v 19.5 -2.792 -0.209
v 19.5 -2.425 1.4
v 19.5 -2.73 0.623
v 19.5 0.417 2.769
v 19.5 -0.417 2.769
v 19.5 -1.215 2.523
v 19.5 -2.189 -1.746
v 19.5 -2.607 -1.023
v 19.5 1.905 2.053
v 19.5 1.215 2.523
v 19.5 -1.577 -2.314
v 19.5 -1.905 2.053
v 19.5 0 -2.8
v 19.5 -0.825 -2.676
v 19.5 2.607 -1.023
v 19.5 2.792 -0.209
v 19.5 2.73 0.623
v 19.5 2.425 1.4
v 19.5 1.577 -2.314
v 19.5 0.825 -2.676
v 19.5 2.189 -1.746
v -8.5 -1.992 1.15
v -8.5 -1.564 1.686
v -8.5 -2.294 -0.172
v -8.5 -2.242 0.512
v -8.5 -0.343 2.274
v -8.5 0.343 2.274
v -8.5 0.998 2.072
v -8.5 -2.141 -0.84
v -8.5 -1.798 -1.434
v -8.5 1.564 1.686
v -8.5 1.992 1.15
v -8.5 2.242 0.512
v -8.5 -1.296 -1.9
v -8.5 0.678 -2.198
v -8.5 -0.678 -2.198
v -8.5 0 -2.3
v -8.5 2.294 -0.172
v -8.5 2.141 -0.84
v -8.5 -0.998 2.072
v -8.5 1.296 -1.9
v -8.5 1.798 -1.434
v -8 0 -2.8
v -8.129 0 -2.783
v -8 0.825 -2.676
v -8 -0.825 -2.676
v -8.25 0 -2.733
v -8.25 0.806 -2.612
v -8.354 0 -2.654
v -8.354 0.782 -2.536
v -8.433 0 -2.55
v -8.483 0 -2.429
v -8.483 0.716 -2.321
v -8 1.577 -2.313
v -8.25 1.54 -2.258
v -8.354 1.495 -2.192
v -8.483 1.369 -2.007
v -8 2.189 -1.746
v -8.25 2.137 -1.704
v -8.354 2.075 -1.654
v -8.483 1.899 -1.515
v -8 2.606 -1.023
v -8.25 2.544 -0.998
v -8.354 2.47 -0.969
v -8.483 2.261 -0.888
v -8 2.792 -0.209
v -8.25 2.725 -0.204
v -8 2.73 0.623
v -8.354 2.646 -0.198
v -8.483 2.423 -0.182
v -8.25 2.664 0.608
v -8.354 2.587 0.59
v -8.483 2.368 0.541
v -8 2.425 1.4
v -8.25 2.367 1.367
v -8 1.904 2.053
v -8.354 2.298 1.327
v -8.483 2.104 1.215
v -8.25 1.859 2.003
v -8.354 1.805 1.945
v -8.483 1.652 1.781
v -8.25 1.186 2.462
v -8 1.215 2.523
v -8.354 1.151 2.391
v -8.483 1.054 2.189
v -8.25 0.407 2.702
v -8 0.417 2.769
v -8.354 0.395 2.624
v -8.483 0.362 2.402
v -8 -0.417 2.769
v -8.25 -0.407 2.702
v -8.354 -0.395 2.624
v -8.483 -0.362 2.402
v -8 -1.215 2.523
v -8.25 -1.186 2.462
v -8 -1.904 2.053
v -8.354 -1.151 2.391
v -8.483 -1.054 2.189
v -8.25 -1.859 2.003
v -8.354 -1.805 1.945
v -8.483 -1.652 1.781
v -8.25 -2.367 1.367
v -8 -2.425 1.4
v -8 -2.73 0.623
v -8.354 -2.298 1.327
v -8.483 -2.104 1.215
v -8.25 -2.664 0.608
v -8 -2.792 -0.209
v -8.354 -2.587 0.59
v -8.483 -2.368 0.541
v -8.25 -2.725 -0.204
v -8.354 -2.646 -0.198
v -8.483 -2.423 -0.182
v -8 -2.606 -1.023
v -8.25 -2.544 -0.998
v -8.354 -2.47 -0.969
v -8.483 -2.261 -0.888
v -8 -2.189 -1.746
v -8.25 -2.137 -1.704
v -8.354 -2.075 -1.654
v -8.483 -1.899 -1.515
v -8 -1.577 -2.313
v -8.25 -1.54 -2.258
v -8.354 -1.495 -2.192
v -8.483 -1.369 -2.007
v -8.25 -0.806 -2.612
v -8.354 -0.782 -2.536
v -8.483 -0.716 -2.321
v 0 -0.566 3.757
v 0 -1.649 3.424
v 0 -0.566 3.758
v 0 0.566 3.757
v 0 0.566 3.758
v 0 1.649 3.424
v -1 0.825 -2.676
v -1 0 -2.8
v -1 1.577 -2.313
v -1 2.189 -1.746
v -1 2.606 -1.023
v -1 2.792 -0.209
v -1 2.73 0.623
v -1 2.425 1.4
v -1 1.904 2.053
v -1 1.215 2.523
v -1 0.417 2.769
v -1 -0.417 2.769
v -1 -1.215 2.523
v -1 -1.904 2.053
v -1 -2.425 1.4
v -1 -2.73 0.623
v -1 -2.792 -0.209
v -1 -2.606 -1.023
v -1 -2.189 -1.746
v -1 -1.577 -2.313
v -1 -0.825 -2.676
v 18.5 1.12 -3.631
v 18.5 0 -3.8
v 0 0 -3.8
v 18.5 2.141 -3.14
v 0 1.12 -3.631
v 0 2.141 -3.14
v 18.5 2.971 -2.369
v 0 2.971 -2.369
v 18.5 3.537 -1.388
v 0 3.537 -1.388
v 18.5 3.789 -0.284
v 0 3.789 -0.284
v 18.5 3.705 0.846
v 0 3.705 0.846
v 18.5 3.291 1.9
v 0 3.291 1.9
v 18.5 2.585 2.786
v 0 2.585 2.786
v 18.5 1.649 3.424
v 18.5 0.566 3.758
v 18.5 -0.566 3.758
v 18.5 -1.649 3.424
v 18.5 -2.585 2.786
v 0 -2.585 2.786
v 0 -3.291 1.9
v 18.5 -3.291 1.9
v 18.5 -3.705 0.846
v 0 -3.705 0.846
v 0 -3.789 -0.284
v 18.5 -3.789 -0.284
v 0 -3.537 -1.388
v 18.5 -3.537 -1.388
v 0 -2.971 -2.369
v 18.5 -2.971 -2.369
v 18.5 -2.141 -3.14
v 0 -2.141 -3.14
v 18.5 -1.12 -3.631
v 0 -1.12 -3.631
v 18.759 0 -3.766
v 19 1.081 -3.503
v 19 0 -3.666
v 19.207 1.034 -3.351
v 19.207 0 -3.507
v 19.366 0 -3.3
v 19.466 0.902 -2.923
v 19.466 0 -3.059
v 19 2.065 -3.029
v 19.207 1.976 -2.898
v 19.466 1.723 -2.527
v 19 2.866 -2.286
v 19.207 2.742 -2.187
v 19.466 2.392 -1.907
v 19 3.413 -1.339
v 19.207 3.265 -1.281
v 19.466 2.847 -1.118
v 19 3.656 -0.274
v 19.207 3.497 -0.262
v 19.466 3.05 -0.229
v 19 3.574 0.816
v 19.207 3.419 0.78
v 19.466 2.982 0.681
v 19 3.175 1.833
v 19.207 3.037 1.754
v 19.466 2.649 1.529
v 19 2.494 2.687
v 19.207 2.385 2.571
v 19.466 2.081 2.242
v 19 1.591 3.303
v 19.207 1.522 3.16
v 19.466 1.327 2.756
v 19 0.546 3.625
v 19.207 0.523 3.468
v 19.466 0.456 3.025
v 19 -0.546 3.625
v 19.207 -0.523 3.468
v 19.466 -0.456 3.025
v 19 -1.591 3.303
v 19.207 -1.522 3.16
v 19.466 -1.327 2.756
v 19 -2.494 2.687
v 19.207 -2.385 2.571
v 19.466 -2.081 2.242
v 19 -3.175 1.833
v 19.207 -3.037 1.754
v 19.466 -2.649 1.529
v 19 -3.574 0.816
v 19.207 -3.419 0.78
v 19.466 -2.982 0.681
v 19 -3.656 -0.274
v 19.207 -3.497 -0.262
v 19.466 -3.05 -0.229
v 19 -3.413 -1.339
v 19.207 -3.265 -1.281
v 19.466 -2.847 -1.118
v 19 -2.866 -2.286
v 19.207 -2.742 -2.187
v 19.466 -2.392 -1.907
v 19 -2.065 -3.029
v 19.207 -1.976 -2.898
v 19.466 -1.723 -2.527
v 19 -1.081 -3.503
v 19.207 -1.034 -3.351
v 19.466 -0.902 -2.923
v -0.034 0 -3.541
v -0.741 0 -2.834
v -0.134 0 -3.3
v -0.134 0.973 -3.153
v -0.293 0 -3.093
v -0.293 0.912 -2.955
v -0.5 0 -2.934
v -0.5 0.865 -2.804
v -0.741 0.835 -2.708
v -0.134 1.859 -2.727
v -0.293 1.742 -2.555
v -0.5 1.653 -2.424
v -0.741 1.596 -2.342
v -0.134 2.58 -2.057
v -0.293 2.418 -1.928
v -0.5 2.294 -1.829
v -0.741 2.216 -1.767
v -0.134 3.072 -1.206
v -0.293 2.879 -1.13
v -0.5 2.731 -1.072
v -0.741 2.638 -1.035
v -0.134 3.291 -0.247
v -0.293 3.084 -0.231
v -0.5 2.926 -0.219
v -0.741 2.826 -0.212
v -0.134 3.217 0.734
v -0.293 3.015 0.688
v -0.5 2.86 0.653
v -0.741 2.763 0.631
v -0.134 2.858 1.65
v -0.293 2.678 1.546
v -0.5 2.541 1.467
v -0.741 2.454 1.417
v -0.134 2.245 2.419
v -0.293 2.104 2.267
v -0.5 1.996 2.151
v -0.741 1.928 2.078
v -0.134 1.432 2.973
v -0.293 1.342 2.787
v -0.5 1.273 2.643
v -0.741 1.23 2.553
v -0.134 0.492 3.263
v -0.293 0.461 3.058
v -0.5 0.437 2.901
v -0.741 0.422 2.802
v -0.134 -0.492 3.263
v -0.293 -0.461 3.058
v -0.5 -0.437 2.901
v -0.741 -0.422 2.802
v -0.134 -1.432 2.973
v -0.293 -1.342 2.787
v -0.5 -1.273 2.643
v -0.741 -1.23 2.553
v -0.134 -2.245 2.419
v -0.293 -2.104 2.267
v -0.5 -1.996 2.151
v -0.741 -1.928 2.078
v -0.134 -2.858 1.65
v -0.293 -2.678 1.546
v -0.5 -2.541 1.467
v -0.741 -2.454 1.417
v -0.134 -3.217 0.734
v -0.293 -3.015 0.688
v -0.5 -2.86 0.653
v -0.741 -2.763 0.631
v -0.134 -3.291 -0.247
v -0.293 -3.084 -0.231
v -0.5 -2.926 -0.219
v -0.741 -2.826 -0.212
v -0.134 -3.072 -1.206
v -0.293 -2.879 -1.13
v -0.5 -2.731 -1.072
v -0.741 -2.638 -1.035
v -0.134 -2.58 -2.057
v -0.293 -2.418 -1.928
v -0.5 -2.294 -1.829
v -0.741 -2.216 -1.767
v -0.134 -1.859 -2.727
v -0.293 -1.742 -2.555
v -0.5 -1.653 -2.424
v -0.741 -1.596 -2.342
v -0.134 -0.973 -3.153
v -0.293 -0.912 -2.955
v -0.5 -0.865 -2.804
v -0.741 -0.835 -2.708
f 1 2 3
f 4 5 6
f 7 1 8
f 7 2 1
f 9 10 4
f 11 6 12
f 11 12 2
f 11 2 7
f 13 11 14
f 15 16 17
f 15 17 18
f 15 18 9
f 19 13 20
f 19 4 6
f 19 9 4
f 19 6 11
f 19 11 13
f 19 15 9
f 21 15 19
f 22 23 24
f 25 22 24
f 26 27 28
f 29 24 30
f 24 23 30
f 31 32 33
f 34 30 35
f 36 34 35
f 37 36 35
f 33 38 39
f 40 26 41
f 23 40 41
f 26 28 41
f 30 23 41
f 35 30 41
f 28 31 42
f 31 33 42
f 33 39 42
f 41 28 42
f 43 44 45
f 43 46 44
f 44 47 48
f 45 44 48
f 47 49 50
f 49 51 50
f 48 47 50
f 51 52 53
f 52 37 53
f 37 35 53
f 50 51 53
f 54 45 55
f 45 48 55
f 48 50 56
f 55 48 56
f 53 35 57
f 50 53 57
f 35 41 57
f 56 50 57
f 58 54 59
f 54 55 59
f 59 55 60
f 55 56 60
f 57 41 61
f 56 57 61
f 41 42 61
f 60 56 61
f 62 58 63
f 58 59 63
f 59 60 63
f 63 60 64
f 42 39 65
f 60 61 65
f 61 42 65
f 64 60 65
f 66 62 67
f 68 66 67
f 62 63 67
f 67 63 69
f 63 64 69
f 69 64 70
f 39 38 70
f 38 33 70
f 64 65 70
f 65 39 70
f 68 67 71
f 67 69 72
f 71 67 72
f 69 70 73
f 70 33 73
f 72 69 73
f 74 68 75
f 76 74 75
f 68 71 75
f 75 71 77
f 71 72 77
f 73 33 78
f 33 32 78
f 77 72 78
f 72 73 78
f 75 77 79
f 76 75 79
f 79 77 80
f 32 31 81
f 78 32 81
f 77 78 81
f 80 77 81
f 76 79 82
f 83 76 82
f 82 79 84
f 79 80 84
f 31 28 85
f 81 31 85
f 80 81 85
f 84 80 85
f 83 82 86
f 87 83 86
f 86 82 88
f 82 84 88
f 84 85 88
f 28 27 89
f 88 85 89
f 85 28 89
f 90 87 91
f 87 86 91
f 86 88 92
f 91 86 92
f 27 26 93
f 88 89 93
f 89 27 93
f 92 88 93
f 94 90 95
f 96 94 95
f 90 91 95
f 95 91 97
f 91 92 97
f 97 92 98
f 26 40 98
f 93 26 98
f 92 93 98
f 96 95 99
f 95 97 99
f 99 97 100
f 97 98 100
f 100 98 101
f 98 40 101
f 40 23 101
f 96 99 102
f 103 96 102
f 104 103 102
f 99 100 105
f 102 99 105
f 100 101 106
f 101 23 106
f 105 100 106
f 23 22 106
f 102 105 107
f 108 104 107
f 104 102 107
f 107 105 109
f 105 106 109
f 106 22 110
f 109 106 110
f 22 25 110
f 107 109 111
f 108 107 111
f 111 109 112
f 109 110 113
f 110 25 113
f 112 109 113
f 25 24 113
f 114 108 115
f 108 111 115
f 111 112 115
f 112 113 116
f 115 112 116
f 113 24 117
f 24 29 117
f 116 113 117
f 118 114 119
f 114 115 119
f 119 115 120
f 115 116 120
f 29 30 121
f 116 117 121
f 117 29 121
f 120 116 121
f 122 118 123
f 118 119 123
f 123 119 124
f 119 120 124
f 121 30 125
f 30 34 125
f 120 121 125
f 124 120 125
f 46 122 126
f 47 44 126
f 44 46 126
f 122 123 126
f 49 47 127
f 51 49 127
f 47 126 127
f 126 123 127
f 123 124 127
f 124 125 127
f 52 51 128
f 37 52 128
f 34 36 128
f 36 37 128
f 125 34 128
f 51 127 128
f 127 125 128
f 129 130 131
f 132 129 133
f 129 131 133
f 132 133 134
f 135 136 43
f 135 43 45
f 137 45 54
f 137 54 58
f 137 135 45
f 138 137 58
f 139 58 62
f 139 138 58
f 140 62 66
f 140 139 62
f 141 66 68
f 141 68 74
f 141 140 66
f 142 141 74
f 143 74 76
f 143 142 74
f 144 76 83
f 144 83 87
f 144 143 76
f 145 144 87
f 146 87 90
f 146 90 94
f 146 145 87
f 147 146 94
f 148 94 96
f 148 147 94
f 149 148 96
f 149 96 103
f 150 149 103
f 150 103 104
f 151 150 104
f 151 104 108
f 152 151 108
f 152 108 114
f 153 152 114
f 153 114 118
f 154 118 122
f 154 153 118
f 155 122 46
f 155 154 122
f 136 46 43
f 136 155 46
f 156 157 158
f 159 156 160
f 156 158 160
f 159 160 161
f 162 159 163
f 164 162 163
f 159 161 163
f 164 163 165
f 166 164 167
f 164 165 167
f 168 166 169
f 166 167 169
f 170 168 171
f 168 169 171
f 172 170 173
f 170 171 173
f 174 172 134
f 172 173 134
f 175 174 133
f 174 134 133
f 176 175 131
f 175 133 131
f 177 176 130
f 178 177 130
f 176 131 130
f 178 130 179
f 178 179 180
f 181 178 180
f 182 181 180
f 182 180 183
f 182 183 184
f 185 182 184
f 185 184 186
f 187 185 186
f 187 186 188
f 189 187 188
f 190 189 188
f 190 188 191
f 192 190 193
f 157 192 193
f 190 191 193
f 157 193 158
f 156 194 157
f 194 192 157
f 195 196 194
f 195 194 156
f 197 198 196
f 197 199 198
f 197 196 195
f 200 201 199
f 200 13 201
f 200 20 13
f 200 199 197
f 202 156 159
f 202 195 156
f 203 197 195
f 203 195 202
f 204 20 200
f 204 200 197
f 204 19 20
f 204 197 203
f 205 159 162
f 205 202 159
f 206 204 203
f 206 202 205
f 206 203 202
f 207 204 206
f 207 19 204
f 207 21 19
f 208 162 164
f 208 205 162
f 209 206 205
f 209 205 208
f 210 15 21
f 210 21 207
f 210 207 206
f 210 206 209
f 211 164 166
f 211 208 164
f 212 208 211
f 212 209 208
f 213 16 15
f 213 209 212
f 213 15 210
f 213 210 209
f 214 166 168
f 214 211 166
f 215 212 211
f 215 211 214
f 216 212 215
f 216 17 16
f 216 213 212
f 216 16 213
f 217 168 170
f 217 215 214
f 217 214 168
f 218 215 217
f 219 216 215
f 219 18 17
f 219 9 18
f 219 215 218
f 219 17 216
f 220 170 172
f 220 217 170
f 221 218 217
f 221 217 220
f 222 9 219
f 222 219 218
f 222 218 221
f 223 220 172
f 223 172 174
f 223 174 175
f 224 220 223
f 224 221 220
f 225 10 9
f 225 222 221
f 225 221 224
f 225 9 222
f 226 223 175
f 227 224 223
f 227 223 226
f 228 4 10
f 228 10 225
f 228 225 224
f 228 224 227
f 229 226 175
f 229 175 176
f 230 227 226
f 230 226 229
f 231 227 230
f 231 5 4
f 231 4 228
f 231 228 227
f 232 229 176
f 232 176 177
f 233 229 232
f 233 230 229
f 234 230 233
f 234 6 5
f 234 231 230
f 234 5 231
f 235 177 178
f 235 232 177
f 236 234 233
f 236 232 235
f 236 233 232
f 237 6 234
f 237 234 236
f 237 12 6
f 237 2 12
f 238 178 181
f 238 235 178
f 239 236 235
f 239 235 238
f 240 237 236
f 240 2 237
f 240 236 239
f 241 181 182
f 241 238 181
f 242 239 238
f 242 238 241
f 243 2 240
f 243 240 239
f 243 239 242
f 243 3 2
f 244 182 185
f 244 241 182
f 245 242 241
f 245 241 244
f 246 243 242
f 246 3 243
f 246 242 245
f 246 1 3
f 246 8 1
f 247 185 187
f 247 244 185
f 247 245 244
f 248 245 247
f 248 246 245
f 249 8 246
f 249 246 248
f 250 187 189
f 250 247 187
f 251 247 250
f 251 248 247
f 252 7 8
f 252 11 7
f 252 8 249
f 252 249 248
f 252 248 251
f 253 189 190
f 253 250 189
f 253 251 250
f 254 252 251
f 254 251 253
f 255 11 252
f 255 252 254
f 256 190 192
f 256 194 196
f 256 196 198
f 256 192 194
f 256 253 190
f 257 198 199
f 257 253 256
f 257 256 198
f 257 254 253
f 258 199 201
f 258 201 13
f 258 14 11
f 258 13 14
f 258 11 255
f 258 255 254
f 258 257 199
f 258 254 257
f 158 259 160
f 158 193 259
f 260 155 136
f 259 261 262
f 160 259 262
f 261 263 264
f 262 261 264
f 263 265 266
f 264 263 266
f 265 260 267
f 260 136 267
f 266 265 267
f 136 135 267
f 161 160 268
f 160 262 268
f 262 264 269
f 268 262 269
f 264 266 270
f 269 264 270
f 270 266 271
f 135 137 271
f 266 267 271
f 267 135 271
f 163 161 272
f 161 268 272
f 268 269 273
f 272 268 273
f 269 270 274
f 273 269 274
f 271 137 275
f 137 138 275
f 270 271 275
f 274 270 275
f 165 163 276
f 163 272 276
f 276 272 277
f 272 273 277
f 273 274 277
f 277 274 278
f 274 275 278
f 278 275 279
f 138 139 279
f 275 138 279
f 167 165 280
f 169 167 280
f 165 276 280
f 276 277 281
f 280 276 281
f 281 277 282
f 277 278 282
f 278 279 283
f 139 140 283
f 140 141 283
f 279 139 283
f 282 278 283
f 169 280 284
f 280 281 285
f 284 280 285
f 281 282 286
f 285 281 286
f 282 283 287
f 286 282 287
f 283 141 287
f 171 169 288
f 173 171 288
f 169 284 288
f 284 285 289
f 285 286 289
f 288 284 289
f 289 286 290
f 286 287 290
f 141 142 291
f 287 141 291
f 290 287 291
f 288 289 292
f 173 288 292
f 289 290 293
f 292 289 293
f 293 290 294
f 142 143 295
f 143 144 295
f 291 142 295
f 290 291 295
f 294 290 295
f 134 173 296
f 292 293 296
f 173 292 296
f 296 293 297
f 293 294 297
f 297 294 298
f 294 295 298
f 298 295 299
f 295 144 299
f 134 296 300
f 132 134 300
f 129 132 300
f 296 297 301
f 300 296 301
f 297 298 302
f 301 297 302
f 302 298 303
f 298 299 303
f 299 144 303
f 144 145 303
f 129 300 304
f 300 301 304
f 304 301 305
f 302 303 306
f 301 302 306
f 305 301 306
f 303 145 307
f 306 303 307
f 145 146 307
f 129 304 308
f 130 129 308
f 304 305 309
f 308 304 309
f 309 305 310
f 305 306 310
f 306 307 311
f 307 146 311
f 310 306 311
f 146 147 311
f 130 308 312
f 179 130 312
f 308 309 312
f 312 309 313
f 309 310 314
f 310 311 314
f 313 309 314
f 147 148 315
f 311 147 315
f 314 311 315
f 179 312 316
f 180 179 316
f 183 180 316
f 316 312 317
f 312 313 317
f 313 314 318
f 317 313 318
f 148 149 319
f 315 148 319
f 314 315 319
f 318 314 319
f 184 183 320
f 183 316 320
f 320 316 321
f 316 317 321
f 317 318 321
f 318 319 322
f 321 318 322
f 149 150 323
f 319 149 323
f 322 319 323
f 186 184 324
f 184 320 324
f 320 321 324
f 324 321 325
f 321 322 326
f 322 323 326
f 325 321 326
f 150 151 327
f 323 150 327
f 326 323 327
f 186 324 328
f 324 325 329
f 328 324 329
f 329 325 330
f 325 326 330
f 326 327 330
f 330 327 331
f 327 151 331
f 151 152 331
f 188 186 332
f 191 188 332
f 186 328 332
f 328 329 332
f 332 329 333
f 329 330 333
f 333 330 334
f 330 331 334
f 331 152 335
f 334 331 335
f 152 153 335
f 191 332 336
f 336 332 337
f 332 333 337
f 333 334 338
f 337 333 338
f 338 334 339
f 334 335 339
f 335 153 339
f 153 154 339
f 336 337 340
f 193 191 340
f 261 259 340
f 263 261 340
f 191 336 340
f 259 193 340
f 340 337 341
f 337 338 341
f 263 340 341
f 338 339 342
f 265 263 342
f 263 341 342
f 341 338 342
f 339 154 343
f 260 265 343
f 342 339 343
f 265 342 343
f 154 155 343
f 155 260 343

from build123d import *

# Parameters (mm, degrees)
CROQUIS1_R              = 3.8
CROQUIS1_R_2            = 2.8
SALIENTE_EXTRUIR1_DEPTH = 19.5
CROQUIS1_4_R            = 2.8
SALIENTE_EXTRUIR2_DEPTH = 8.5
REDONDEO1_R             = 1
REDONDEO2_R             = 0.5


with BuildPart() as part:
    # Croquis1 → Saliente-Extruir1 (new body)
    # profile 1 of 2: a face of its own
    with BuildSketch(Plane.YZ):
        with Locations(Location((0, 0, 0), (0, 0, 270))):
            Circle(CROQUIS1_R)
        Circle(CROQUIS1_R_2, mode=Mode.SUBTRACT)
    # profile 2 of 2: a face of its own
    with BuildSketch(Plane.YZ):
        Circle(CROQUIS1_R_2)
    extrude(amount=SALIENTE_EXTRUIR1_DEPTH)

    # Croquis1<4> → Saliente-Extruir2 (add)
    with BuildSketch(Plane.YZ):
        with Locations(Location((0, 0, 0), (0, 0, 270))):
            Circle(CROQUIS1_4_R)
    extrude(amount=-SALIENTE_EXTRUIR2_DEPTH)

    # Redondeo1
    redondeo1_edges = [part.edges().sort_by_distance(p)[0] for p in [
        (19.5, 0, 3.8),
        (0, 0, 2.8),
    ]]
    fillet(redondeo1_edges, radius=REDONDEO1_R - 0.0001)  # a hair under: the kernel refuses the full size

    # Redondeo2
    redondeo2_edges = [part.edges().sort_by_distance(p)[0] for p in [
        (-8.5, 0, 2.8),
    ]]
    fillet(redondeo2_edges, radius=REDONDEO2_R)


solid = part.part
